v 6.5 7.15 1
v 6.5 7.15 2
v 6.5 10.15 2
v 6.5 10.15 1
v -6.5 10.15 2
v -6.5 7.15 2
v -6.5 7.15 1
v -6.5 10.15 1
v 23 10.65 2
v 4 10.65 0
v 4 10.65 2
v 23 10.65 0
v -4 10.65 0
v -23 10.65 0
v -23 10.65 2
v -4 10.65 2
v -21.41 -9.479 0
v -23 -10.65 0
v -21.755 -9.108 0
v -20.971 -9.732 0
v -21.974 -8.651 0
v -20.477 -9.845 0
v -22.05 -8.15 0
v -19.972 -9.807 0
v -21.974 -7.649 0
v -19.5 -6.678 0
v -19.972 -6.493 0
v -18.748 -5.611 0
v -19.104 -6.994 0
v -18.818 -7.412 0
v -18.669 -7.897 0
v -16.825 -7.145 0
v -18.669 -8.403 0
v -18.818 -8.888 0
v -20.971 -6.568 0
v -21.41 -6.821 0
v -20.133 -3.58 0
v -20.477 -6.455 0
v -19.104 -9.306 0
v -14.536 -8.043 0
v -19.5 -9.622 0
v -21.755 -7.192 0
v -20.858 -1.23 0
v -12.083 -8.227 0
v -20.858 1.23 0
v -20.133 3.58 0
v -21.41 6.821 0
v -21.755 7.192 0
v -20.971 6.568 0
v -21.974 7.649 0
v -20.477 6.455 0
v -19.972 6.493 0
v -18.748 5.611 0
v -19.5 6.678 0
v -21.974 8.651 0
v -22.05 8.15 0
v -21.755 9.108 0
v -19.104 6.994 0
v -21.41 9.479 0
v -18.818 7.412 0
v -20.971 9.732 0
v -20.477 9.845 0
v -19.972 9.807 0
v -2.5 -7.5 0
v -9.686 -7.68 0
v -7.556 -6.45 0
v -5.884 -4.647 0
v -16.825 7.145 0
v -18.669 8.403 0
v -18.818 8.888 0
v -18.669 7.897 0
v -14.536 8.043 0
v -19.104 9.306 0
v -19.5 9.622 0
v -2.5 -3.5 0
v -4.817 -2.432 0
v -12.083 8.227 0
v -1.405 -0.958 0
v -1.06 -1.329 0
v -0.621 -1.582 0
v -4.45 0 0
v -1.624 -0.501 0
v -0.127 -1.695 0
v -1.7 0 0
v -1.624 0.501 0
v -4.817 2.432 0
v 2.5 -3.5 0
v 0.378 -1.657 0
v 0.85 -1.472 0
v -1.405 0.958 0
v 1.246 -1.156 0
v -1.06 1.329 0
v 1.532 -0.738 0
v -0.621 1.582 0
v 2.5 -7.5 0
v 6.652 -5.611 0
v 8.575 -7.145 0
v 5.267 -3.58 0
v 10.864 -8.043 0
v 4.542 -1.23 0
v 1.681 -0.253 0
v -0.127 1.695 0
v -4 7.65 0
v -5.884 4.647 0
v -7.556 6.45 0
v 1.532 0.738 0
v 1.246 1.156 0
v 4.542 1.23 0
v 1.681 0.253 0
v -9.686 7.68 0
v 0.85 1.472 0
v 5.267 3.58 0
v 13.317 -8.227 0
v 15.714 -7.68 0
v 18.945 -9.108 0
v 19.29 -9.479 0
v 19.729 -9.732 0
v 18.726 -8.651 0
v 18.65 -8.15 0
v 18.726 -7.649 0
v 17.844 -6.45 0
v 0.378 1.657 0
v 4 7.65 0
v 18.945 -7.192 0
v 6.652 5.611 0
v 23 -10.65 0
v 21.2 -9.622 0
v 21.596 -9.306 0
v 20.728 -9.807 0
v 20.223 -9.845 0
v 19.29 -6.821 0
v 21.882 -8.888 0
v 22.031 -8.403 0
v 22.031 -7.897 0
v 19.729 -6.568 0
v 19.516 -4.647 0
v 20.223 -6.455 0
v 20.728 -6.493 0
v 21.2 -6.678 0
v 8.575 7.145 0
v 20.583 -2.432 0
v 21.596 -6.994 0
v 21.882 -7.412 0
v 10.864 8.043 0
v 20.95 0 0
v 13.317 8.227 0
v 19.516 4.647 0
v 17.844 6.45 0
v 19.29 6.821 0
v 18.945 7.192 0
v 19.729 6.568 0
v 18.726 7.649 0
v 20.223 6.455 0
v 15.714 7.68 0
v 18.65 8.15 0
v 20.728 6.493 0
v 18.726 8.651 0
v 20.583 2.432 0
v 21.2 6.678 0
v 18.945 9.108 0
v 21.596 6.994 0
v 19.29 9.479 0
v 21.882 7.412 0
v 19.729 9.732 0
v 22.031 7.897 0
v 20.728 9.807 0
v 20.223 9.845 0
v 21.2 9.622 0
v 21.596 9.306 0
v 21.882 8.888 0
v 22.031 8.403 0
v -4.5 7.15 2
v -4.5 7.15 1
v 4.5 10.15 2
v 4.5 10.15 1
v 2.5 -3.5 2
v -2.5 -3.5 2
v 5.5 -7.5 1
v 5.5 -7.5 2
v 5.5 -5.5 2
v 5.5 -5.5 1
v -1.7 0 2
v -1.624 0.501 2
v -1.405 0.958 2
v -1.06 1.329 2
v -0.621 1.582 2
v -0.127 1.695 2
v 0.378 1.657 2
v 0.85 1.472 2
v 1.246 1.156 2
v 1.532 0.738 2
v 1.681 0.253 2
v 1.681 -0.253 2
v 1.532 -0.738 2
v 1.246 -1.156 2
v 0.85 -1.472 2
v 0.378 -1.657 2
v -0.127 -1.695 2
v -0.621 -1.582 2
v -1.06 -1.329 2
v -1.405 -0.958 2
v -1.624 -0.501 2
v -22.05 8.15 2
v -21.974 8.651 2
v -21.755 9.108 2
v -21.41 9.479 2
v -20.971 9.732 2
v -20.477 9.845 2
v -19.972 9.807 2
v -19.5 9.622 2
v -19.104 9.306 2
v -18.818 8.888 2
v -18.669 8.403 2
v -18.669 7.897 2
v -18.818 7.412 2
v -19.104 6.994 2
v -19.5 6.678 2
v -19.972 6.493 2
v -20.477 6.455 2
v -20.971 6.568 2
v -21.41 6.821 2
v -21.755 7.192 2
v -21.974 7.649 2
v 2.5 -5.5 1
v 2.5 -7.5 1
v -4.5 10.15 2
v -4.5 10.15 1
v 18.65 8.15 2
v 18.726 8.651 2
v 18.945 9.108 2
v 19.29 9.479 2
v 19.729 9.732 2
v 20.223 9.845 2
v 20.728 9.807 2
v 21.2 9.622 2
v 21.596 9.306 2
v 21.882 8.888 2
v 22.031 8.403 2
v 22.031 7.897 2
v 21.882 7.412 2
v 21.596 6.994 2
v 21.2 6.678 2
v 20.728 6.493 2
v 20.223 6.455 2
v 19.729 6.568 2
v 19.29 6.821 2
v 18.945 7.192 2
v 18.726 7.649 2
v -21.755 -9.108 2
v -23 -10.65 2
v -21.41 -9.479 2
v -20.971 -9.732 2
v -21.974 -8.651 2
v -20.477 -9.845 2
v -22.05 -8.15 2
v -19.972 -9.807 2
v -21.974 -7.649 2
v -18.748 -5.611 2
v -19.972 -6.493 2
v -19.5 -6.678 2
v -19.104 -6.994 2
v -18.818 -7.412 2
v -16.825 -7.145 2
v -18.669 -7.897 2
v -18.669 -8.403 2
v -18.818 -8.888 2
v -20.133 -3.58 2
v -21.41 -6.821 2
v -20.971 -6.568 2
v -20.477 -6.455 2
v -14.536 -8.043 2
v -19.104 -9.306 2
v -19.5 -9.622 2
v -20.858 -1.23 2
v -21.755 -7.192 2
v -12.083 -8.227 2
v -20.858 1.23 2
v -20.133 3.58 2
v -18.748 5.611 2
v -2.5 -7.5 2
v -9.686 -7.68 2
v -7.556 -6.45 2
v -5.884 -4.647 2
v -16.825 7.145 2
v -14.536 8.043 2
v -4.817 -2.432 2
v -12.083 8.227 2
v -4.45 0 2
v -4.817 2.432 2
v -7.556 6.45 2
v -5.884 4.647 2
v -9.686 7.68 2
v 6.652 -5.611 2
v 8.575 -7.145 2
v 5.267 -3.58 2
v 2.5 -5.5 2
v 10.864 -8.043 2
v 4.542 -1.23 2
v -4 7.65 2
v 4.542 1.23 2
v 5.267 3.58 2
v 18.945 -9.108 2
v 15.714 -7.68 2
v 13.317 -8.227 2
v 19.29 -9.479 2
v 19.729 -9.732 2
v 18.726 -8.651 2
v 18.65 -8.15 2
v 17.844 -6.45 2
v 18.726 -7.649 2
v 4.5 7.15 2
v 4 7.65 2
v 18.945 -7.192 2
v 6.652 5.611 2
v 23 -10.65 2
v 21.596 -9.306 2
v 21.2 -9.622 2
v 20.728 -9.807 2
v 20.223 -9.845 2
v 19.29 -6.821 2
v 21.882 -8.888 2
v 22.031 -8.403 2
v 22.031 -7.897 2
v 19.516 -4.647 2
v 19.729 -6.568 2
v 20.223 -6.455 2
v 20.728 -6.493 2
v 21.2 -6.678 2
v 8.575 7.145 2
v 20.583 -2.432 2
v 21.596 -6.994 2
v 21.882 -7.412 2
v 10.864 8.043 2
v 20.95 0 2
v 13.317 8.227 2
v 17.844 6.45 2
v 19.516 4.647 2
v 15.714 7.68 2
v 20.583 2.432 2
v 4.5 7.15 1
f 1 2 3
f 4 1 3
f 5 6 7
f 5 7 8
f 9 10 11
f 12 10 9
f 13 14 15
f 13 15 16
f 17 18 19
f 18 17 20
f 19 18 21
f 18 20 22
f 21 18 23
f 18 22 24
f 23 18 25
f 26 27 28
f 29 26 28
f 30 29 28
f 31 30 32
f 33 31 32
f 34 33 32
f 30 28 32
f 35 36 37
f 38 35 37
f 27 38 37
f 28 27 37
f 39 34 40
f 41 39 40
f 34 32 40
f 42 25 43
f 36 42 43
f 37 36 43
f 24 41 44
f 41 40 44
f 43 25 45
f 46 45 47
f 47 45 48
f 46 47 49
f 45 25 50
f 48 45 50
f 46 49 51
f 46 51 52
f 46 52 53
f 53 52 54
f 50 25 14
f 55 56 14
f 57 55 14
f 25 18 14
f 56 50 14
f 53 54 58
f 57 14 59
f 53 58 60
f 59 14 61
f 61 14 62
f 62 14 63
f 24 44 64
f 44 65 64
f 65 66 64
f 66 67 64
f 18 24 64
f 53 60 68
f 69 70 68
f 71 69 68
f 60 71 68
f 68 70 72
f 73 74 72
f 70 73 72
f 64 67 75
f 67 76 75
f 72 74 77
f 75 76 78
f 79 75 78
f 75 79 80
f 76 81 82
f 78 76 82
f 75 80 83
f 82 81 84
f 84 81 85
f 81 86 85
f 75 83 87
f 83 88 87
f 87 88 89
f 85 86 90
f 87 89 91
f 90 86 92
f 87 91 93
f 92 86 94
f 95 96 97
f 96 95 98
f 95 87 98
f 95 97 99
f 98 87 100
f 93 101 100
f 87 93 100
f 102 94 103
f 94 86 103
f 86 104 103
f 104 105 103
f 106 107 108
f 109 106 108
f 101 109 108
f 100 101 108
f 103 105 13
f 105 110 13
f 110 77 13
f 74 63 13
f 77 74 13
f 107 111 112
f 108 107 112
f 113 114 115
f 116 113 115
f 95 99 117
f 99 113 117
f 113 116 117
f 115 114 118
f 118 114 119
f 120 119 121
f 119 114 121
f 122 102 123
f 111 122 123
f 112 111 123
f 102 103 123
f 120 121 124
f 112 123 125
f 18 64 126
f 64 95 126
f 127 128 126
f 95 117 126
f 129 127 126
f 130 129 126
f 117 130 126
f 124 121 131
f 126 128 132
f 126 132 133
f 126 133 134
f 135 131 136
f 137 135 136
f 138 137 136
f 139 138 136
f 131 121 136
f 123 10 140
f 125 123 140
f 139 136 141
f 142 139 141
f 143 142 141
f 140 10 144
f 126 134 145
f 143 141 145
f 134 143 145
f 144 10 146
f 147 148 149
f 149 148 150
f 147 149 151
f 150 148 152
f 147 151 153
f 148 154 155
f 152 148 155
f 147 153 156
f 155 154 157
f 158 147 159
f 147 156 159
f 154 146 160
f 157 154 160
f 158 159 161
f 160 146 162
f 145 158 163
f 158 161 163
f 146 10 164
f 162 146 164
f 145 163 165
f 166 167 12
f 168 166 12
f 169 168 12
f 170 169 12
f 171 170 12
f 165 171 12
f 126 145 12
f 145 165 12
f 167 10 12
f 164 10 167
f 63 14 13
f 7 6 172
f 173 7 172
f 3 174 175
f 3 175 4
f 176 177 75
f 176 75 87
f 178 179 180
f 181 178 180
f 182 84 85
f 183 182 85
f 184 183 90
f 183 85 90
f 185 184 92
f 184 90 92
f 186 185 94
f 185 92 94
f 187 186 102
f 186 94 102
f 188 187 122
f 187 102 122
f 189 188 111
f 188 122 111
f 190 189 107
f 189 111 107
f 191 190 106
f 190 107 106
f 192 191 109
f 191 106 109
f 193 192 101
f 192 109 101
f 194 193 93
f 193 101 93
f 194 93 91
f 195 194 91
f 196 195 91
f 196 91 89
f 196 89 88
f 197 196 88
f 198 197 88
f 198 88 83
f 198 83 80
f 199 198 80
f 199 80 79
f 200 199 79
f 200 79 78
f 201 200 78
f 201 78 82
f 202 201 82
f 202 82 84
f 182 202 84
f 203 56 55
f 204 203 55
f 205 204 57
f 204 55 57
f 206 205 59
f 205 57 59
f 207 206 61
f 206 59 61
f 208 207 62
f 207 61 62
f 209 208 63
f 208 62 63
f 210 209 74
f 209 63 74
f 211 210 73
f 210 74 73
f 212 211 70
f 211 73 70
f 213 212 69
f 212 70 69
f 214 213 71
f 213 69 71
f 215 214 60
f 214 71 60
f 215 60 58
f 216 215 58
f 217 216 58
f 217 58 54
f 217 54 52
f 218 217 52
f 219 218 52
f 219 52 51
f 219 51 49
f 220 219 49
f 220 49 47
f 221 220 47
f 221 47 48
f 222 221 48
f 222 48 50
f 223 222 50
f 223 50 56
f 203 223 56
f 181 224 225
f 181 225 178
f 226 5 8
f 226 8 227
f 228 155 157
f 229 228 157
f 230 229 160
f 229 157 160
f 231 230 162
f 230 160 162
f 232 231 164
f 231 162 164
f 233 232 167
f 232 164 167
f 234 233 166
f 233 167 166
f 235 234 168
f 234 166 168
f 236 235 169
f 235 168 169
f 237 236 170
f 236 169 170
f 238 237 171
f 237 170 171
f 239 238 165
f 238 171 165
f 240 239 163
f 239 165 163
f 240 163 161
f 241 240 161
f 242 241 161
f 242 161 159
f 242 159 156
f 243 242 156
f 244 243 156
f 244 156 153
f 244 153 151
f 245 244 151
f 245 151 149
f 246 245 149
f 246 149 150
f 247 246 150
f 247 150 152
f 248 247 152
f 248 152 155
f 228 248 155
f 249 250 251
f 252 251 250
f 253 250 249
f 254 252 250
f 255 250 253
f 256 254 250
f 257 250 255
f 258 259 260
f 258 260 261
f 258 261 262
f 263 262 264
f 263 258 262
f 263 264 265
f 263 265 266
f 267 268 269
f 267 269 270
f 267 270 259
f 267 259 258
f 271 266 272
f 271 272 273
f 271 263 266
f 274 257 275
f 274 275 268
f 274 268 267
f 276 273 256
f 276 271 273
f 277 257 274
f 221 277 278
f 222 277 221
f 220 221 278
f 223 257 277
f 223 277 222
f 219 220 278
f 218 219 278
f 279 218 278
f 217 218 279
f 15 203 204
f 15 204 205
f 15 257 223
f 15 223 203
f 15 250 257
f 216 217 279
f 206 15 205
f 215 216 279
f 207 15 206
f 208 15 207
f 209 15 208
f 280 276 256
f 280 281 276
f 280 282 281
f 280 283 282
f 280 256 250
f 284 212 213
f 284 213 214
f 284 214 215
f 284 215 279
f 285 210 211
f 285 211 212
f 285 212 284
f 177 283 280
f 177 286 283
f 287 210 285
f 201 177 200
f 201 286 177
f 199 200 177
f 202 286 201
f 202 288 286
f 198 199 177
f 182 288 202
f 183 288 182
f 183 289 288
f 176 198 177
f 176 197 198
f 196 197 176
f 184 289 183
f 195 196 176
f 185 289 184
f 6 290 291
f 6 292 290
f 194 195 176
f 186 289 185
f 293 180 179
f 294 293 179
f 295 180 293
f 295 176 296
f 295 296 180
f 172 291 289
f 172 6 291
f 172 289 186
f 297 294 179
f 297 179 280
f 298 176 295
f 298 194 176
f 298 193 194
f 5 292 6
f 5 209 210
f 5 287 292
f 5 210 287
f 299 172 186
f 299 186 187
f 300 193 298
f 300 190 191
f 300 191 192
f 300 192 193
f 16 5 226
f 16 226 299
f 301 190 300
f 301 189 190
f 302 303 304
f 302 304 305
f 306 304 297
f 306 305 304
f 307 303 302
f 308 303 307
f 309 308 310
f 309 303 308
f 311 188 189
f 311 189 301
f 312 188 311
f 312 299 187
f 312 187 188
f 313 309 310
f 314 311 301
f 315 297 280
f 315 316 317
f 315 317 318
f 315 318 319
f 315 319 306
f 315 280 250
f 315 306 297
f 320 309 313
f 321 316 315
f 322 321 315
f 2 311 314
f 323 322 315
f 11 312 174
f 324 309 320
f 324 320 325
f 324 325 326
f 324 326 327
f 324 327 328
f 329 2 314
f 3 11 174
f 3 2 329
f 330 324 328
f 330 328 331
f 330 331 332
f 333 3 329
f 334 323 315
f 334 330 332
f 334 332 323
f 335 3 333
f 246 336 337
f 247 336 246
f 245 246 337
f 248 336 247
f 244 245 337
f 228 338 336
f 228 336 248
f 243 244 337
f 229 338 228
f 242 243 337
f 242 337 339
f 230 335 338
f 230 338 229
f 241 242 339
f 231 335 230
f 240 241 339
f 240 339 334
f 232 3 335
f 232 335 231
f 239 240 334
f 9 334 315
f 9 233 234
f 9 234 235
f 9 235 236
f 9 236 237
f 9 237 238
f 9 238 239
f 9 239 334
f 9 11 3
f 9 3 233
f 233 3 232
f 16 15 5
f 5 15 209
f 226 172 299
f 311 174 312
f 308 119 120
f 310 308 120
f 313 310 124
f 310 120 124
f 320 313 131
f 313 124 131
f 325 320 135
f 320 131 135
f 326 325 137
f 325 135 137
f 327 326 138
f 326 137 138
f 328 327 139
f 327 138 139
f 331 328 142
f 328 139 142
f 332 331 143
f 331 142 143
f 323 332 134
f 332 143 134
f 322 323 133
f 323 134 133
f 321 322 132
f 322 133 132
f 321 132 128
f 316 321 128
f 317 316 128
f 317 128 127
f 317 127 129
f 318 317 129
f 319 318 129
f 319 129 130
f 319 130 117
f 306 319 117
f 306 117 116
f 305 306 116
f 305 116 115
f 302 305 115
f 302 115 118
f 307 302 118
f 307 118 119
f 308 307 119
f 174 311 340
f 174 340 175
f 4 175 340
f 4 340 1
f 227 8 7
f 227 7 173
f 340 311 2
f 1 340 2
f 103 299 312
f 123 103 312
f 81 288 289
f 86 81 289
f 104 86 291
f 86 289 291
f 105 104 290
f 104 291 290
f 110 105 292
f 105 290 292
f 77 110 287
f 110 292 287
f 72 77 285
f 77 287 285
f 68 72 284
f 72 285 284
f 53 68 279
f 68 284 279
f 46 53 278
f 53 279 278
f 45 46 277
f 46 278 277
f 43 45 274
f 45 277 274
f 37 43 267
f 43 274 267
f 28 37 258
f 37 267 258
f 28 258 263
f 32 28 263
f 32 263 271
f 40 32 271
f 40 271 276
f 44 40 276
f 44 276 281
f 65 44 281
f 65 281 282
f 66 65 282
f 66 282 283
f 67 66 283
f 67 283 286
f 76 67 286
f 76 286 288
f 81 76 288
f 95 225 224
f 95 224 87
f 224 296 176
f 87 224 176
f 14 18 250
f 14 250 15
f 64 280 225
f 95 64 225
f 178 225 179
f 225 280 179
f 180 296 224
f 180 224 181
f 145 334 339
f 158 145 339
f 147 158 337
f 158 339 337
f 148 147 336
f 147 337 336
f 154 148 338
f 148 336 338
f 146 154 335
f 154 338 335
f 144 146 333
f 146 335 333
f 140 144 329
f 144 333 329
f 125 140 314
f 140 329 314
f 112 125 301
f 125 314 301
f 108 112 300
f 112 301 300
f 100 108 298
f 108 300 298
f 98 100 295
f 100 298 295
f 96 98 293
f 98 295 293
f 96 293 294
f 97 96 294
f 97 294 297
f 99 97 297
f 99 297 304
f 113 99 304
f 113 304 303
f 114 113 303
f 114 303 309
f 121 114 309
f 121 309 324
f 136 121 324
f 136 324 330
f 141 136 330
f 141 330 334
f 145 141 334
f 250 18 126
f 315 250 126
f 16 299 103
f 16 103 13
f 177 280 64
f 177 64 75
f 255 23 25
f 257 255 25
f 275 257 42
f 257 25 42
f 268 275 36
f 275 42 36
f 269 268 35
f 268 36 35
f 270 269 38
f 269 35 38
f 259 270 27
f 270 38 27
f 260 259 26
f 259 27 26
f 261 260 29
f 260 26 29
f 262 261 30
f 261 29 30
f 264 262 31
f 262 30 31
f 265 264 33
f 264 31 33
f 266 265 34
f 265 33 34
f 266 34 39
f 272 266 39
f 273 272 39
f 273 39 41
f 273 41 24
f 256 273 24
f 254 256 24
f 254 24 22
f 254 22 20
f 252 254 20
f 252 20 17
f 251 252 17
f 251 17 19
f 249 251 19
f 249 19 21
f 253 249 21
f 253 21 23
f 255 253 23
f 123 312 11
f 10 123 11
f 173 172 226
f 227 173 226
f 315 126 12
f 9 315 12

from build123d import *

# Parameters (mm, degrees)
SKETCH_1_W          = 46
SKETCH_1_H          = 21.3
EXTRUDE_1_DEPTH     = 2
SKETCH_2_R          = 8.25
CUT_EXTRUDE_1_DEPTH = 3
SKETCH_3_W          = 8
SKETCH_3_H          = 3
CUT_EXTRUDE_2_DEPTH = 3
SKETCH_4_W          = 5
SKETCH_4_H          = 4
CUT_EXTRUDE_3_DEPTH = 3
SKETCH_5_W          = 3
SKETCH_5_H          = 2
SKETCH_5_W_2        = 2
SKETCH_5_H_2        = 3
CUT_EXTRUDE_4_DEPTH = 1
HOLE_WIZARD_M3_1_D  = 3.4


with BuildPart() as part:
    # 草圖1 → 填料-伸長1 (new body)
    with BuildSketch(Plane.XY):
        Rectangle(SKETCH_1_W, SKETCH_1_H)
    extrude(amount=EXTRUDE_1_DEPTH)

    # 草圖2 → 除料-伸長1 (cut, through all)
    with BuildSketch(Plane.XY.offset(2)):
        with Locations((-12.7, 0)):
            Circle(SKETCH_2_R)
        with Locations((12.7, 0)):
            Circle(SKETCH_2_R)
    extrude(amount=-CUT_EXTRUDE_1_DEPTH, mode=Mode.SUBTRACT)

    # 草圖3 → 除料-伸長2 (cut, through all)
    with BuildSketch(Plane.XY.offset(2)):
        with Locations((0, 9.15)):
            Rectangle(SKETCH_3_W, SKETCH_3_H)
    extrude(amount=-CUT_EXTRUDE_2_DEPTH, mode=Mode.SUBTRACT)

    # 草圖4 → 除料-伸長3 (cut, through all)
    with BuildSketch(Plane.XY.offset(2)):
        with Locations((0, -5.5)):
            Rectangle(SKETCH_4_W, SKETCH_4_H)
    extrude(amount=-CUT_EXTRUDE_3_DEPTH, mode=Mode.SUBTRACT)

    # 草圖5 → 除料-伸長4 (cut)
    with BuildSketch(Plane.XY.offset(2)):
        with Locations((4, -6.5)):
            Rectangle(SKETCH_5_W, SKETCH_5_H)
        with Locations((-5.5, 8.65)):
            Rectangle(SKETCH_5_W_2, SKETCH_5_H_2)
        with Locations((5.5, 8.65)):
            Rectangle(SKETCH_5_W_2, SKETCH_5_H_2)
    extrude(amount=-CUT_EXTRUDE_4_DEPTH, mode=Mode.SUBTRACT)

    # M3 餘隙孔1 (through all)
    with Locations(Plane.XY.offset(2)):
        with Locations((0, 0), (20.35, 8.15), (-20.35, -8.15), (-20.35, 8.15), (20.35, -8.15)):
            Hole(HOLE_WIZARD_M3_1_D / 2)


solid = part.part
